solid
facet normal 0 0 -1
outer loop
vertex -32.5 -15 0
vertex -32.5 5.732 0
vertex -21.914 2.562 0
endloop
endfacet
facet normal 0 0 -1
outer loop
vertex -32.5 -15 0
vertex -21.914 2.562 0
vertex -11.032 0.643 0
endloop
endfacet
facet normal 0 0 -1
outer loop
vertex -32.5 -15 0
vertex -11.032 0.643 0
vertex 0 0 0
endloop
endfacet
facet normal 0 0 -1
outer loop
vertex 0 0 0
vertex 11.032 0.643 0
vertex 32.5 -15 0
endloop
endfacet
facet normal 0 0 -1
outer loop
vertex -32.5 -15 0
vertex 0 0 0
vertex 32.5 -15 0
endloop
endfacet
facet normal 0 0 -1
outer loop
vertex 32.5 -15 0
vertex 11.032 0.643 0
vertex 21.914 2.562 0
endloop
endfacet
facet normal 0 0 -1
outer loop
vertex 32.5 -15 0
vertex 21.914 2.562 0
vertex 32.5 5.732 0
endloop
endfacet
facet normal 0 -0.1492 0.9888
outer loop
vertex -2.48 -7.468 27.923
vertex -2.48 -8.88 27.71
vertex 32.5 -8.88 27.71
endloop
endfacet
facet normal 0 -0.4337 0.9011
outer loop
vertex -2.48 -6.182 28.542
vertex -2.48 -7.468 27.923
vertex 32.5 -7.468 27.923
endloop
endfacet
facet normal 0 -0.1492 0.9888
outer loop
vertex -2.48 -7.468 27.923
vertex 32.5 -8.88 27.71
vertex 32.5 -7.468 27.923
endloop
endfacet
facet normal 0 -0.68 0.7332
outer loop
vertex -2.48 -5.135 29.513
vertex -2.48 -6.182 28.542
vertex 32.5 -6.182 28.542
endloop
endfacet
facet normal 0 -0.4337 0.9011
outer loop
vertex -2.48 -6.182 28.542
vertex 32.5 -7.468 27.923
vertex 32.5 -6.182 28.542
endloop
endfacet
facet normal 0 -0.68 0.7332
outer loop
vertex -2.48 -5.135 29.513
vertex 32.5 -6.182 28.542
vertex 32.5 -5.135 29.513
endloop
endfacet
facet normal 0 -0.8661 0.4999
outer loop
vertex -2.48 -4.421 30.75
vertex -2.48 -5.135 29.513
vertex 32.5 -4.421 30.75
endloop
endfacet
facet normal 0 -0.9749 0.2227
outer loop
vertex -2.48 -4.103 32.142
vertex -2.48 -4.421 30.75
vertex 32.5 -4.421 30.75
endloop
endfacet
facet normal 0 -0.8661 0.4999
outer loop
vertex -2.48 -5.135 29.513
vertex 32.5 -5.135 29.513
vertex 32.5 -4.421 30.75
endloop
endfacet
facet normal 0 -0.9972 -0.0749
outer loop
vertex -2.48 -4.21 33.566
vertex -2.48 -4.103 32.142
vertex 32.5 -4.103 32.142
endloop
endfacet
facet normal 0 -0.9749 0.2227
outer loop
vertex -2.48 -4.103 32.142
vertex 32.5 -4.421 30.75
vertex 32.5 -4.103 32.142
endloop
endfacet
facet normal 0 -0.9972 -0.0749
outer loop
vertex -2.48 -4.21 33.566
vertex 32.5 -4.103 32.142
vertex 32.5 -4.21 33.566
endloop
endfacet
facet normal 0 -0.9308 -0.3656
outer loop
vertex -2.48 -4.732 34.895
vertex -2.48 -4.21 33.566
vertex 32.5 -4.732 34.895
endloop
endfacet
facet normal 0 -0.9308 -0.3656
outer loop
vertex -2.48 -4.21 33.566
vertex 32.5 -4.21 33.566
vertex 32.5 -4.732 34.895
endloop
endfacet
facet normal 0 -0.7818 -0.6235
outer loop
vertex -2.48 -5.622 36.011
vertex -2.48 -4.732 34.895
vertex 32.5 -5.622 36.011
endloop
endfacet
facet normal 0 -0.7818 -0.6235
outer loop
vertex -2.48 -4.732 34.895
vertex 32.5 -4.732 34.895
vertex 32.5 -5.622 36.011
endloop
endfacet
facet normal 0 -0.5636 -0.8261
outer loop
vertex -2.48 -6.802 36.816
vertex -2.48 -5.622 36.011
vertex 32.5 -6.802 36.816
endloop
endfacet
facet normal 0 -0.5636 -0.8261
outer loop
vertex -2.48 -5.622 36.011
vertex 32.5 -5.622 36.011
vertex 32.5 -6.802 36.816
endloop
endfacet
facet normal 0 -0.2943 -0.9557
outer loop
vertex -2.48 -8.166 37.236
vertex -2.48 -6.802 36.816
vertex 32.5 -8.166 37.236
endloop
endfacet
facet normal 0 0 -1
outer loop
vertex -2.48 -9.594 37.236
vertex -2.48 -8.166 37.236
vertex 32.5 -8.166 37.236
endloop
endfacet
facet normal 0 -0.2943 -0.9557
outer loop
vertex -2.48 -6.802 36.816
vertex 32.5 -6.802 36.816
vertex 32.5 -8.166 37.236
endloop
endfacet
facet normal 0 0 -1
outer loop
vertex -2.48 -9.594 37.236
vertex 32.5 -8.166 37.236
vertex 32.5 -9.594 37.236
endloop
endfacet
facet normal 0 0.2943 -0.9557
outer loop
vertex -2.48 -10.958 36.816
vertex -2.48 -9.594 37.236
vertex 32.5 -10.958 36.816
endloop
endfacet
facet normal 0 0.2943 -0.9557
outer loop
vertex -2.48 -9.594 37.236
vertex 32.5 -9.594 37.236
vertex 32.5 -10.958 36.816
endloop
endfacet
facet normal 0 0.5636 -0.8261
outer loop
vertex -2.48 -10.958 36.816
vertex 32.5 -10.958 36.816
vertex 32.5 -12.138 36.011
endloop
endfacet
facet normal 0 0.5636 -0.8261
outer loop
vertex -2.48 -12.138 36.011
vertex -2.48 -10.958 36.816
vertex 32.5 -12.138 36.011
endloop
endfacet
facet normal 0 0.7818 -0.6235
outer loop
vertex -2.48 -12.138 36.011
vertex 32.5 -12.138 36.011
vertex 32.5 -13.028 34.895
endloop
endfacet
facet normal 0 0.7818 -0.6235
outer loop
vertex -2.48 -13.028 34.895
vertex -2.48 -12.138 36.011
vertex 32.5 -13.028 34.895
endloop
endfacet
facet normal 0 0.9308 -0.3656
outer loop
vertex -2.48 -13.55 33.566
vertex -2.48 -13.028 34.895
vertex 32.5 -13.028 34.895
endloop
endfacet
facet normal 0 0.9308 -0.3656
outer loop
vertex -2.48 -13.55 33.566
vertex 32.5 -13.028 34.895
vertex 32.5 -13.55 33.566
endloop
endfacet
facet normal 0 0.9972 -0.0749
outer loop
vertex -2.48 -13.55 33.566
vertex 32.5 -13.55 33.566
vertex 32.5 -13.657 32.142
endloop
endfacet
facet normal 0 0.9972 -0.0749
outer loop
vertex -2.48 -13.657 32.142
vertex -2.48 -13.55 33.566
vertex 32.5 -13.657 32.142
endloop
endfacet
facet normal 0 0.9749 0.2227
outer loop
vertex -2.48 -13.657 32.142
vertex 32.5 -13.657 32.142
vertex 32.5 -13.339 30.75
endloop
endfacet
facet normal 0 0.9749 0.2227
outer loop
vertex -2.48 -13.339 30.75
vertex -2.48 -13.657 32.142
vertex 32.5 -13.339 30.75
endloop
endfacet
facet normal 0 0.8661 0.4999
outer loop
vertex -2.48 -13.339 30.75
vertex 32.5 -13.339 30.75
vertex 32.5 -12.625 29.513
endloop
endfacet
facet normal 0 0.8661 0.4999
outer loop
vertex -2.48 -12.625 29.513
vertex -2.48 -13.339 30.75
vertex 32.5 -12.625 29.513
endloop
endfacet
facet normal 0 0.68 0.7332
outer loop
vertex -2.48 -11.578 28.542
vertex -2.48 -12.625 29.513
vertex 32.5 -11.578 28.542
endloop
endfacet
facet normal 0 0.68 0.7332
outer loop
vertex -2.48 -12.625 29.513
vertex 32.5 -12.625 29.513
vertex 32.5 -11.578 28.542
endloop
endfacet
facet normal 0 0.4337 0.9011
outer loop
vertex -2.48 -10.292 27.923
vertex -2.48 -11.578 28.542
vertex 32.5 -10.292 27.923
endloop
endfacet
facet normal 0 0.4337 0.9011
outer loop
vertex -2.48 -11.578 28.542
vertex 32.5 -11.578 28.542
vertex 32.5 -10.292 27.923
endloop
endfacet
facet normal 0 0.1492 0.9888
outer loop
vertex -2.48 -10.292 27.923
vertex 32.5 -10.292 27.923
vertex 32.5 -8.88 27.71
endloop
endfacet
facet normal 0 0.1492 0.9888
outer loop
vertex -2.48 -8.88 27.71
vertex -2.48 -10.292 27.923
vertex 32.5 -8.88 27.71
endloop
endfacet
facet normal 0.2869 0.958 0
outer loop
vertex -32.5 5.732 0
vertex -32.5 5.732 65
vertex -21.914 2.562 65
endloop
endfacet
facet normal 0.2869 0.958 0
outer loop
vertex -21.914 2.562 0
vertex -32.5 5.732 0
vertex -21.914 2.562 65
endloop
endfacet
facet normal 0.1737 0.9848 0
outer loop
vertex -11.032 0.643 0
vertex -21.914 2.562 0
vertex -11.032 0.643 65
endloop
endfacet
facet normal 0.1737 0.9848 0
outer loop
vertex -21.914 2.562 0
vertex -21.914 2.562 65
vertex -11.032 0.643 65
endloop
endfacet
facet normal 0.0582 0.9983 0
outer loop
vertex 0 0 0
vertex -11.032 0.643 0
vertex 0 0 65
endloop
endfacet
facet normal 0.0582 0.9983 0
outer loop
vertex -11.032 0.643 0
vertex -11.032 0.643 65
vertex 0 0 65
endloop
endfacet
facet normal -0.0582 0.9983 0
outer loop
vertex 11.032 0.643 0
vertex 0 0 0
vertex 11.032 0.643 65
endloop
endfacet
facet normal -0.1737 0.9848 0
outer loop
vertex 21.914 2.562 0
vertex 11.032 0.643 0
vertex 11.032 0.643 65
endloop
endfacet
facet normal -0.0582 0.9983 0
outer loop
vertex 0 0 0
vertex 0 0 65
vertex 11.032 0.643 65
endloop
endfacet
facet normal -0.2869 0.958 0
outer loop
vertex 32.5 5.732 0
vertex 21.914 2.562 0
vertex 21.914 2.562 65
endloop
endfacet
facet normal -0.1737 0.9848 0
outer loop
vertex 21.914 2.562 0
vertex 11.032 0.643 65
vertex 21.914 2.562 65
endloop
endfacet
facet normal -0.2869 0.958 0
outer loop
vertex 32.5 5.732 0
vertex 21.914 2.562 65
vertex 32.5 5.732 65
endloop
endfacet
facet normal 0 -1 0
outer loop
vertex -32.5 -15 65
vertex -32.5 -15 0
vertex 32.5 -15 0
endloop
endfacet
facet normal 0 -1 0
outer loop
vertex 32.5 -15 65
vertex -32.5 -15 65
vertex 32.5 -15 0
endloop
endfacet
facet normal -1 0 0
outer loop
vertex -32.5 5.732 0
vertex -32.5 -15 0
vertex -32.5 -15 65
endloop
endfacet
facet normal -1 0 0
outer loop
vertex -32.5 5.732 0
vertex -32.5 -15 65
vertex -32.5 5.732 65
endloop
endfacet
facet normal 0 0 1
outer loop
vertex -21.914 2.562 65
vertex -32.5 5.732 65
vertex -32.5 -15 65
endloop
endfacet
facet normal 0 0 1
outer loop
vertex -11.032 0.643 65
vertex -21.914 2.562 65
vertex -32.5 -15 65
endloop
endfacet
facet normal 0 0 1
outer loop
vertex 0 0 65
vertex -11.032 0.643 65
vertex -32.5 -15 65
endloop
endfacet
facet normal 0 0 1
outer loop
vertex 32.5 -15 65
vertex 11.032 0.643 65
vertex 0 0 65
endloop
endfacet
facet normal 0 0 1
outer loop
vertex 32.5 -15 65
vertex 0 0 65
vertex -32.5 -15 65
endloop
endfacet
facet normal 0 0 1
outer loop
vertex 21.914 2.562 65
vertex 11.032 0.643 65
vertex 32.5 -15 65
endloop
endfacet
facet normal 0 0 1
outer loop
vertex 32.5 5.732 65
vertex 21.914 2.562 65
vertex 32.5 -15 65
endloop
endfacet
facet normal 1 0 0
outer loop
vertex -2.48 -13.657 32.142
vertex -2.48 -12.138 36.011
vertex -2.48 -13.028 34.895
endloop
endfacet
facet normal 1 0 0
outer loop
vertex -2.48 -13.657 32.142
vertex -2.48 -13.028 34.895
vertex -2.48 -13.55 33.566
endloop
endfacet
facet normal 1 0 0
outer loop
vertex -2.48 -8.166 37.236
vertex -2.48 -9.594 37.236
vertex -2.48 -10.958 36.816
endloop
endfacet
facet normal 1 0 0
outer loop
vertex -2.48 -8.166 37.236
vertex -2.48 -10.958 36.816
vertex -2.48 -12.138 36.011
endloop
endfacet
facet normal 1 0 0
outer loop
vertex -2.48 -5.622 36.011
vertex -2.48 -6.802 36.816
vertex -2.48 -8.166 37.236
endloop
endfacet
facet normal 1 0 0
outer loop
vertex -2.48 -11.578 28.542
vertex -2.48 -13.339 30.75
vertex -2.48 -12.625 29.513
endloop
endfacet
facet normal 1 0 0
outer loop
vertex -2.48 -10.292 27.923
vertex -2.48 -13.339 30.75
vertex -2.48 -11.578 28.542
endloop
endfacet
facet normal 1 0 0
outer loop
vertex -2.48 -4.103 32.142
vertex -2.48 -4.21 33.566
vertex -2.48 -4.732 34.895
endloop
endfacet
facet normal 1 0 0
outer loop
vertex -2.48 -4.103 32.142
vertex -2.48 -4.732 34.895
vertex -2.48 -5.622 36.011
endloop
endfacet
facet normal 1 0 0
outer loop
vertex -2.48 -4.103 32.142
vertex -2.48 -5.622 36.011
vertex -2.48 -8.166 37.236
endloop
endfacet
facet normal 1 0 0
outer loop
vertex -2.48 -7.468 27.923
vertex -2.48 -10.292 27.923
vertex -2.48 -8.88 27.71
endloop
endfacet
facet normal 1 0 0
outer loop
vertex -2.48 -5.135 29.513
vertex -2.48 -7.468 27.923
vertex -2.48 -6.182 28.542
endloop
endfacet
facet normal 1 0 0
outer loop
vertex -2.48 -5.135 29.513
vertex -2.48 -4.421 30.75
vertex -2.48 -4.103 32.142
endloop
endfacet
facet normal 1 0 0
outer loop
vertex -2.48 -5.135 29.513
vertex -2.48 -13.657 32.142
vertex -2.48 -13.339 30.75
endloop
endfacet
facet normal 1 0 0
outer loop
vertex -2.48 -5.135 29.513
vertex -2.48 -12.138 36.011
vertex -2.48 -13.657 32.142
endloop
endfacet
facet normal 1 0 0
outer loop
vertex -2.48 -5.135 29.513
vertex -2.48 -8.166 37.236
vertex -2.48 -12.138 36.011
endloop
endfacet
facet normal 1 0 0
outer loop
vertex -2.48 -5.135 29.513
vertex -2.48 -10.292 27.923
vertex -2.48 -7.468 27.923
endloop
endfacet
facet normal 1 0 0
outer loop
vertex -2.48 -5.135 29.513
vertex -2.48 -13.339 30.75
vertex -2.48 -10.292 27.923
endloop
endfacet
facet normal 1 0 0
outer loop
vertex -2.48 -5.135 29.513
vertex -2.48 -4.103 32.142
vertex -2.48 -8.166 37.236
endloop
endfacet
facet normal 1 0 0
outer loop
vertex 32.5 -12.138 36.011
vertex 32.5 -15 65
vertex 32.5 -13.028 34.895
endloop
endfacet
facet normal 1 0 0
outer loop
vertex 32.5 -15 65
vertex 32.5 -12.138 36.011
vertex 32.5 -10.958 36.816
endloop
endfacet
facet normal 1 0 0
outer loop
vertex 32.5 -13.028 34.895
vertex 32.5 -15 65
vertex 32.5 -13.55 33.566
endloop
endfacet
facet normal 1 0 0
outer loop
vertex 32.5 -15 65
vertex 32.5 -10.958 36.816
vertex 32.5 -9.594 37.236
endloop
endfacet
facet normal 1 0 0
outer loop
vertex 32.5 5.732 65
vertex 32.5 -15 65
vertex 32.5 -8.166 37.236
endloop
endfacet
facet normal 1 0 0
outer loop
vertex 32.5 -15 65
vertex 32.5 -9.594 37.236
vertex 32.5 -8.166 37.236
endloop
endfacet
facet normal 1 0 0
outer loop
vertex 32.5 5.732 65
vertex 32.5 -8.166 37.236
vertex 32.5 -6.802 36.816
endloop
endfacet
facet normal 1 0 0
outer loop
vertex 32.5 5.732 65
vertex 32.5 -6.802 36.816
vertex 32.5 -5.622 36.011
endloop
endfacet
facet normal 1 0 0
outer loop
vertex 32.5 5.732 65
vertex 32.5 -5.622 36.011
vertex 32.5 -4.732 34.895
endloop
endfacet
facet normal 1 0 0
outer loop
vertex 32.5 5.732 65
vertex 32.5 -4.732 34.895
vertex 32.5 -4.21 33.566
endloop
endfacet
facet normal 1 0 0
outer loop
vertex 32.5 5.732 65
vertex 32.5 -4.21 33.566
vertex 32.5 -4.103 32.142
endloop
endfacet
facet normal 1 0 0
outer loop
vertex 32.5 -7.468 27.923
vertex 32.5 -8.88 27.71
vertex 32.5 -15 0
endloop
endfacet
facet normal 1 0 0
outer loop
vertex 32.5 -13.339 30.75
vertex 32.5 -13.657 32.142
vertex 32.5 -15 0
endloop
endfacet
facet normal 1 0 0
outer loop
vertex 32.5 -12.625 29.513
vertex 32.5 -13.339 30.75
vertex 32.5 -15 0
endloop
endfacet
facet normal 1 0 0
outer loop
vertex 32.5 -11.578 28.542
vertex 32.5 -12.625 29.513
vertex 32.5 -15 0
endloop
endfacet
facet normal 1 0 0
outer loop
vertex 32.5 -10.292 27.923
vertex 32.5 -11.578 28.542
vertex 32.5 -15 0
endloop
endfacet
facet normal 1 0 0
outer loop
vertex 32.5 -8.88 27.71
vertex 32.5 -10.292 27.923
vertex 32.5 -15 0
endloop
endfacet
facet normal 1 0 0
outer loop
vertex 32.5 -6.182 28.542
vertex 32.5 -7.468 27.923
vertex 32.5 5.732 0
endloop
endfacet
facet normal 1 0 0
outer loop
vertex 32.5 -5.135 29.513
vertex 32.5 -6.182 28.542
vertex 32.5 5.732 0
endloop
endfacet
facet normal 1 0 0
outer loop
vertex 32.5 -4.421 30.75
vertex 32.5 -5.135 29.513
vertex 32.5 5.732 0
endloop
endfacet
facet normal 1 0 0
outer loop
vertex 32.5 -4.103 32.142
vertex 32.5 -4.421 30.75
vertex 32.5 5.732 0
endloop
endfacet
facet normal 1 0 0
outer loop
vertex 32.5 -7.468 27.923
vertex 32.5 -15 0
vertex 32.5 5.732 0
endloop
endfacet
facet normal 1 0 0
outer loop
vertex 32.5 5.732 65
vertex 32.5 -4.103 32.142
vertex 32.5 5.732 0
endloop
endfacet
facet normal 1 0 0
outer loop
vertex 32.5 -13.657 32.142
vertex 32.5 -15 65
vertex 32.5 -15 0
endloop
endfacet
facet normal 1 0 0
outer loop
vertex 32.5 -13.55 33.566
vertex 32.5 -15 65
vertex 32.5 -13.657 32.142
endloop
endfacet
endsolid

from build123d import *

# Parameters (mm, degrees)
SKIZZE1_W                       = 65
SKIZZE1_H                       = 30
AUFSATZ_LINEAR_AUSTRAGEN1_DEPTH = 65
SKIZZE2_R                       = 95
SCHNITT_LINEAR_AUSTRAGEN1_DEPTH = 65
SKIZZE5_R                       = 4.79
SCHNITT_LINEAR_AUSTRAGEN2_DEPTH = 34.98


with BuildPart() as part:
    # Skizze1 → Aufsatz-Linear austragen1 (new body)
    with BuildSketch(Plane.XY):
        Rectangle(SKIZZE1_W, SKIZZE1_H)
    extrude(amount=AUFSATZ_LINEAR_AUSTRAGEN1_DEPTH)

    # Skizze2 → Schnitt-Linear austragen1 (cut)
    with BuildSketch(Plane.XY.offset(65)):
        with Locations((0, 95)):
            Circle(SKIZZE2_R)
    extrude(amount=-SCHNITT_LINEAR_AUSTRAGEN1_DEPTH, mode=Mode.SUBTRACT)

    # Skizze5 → Schnitt-Linear austragen2 (cut)
    with BuildSketch(Plane(origin=(32.5, 0, 0), x_dir=(0, 0, -1), z_dir=(1, 0, 0))):
        with Locations((-32.5, -8.88)):
            Circle(SKIZZE5_R)
    extrude(amount=-SCHNITT_LINEAR_AUSTRAGEN2_DEPTH, mode=Mode.SUBTRACT)


solid = part.part
